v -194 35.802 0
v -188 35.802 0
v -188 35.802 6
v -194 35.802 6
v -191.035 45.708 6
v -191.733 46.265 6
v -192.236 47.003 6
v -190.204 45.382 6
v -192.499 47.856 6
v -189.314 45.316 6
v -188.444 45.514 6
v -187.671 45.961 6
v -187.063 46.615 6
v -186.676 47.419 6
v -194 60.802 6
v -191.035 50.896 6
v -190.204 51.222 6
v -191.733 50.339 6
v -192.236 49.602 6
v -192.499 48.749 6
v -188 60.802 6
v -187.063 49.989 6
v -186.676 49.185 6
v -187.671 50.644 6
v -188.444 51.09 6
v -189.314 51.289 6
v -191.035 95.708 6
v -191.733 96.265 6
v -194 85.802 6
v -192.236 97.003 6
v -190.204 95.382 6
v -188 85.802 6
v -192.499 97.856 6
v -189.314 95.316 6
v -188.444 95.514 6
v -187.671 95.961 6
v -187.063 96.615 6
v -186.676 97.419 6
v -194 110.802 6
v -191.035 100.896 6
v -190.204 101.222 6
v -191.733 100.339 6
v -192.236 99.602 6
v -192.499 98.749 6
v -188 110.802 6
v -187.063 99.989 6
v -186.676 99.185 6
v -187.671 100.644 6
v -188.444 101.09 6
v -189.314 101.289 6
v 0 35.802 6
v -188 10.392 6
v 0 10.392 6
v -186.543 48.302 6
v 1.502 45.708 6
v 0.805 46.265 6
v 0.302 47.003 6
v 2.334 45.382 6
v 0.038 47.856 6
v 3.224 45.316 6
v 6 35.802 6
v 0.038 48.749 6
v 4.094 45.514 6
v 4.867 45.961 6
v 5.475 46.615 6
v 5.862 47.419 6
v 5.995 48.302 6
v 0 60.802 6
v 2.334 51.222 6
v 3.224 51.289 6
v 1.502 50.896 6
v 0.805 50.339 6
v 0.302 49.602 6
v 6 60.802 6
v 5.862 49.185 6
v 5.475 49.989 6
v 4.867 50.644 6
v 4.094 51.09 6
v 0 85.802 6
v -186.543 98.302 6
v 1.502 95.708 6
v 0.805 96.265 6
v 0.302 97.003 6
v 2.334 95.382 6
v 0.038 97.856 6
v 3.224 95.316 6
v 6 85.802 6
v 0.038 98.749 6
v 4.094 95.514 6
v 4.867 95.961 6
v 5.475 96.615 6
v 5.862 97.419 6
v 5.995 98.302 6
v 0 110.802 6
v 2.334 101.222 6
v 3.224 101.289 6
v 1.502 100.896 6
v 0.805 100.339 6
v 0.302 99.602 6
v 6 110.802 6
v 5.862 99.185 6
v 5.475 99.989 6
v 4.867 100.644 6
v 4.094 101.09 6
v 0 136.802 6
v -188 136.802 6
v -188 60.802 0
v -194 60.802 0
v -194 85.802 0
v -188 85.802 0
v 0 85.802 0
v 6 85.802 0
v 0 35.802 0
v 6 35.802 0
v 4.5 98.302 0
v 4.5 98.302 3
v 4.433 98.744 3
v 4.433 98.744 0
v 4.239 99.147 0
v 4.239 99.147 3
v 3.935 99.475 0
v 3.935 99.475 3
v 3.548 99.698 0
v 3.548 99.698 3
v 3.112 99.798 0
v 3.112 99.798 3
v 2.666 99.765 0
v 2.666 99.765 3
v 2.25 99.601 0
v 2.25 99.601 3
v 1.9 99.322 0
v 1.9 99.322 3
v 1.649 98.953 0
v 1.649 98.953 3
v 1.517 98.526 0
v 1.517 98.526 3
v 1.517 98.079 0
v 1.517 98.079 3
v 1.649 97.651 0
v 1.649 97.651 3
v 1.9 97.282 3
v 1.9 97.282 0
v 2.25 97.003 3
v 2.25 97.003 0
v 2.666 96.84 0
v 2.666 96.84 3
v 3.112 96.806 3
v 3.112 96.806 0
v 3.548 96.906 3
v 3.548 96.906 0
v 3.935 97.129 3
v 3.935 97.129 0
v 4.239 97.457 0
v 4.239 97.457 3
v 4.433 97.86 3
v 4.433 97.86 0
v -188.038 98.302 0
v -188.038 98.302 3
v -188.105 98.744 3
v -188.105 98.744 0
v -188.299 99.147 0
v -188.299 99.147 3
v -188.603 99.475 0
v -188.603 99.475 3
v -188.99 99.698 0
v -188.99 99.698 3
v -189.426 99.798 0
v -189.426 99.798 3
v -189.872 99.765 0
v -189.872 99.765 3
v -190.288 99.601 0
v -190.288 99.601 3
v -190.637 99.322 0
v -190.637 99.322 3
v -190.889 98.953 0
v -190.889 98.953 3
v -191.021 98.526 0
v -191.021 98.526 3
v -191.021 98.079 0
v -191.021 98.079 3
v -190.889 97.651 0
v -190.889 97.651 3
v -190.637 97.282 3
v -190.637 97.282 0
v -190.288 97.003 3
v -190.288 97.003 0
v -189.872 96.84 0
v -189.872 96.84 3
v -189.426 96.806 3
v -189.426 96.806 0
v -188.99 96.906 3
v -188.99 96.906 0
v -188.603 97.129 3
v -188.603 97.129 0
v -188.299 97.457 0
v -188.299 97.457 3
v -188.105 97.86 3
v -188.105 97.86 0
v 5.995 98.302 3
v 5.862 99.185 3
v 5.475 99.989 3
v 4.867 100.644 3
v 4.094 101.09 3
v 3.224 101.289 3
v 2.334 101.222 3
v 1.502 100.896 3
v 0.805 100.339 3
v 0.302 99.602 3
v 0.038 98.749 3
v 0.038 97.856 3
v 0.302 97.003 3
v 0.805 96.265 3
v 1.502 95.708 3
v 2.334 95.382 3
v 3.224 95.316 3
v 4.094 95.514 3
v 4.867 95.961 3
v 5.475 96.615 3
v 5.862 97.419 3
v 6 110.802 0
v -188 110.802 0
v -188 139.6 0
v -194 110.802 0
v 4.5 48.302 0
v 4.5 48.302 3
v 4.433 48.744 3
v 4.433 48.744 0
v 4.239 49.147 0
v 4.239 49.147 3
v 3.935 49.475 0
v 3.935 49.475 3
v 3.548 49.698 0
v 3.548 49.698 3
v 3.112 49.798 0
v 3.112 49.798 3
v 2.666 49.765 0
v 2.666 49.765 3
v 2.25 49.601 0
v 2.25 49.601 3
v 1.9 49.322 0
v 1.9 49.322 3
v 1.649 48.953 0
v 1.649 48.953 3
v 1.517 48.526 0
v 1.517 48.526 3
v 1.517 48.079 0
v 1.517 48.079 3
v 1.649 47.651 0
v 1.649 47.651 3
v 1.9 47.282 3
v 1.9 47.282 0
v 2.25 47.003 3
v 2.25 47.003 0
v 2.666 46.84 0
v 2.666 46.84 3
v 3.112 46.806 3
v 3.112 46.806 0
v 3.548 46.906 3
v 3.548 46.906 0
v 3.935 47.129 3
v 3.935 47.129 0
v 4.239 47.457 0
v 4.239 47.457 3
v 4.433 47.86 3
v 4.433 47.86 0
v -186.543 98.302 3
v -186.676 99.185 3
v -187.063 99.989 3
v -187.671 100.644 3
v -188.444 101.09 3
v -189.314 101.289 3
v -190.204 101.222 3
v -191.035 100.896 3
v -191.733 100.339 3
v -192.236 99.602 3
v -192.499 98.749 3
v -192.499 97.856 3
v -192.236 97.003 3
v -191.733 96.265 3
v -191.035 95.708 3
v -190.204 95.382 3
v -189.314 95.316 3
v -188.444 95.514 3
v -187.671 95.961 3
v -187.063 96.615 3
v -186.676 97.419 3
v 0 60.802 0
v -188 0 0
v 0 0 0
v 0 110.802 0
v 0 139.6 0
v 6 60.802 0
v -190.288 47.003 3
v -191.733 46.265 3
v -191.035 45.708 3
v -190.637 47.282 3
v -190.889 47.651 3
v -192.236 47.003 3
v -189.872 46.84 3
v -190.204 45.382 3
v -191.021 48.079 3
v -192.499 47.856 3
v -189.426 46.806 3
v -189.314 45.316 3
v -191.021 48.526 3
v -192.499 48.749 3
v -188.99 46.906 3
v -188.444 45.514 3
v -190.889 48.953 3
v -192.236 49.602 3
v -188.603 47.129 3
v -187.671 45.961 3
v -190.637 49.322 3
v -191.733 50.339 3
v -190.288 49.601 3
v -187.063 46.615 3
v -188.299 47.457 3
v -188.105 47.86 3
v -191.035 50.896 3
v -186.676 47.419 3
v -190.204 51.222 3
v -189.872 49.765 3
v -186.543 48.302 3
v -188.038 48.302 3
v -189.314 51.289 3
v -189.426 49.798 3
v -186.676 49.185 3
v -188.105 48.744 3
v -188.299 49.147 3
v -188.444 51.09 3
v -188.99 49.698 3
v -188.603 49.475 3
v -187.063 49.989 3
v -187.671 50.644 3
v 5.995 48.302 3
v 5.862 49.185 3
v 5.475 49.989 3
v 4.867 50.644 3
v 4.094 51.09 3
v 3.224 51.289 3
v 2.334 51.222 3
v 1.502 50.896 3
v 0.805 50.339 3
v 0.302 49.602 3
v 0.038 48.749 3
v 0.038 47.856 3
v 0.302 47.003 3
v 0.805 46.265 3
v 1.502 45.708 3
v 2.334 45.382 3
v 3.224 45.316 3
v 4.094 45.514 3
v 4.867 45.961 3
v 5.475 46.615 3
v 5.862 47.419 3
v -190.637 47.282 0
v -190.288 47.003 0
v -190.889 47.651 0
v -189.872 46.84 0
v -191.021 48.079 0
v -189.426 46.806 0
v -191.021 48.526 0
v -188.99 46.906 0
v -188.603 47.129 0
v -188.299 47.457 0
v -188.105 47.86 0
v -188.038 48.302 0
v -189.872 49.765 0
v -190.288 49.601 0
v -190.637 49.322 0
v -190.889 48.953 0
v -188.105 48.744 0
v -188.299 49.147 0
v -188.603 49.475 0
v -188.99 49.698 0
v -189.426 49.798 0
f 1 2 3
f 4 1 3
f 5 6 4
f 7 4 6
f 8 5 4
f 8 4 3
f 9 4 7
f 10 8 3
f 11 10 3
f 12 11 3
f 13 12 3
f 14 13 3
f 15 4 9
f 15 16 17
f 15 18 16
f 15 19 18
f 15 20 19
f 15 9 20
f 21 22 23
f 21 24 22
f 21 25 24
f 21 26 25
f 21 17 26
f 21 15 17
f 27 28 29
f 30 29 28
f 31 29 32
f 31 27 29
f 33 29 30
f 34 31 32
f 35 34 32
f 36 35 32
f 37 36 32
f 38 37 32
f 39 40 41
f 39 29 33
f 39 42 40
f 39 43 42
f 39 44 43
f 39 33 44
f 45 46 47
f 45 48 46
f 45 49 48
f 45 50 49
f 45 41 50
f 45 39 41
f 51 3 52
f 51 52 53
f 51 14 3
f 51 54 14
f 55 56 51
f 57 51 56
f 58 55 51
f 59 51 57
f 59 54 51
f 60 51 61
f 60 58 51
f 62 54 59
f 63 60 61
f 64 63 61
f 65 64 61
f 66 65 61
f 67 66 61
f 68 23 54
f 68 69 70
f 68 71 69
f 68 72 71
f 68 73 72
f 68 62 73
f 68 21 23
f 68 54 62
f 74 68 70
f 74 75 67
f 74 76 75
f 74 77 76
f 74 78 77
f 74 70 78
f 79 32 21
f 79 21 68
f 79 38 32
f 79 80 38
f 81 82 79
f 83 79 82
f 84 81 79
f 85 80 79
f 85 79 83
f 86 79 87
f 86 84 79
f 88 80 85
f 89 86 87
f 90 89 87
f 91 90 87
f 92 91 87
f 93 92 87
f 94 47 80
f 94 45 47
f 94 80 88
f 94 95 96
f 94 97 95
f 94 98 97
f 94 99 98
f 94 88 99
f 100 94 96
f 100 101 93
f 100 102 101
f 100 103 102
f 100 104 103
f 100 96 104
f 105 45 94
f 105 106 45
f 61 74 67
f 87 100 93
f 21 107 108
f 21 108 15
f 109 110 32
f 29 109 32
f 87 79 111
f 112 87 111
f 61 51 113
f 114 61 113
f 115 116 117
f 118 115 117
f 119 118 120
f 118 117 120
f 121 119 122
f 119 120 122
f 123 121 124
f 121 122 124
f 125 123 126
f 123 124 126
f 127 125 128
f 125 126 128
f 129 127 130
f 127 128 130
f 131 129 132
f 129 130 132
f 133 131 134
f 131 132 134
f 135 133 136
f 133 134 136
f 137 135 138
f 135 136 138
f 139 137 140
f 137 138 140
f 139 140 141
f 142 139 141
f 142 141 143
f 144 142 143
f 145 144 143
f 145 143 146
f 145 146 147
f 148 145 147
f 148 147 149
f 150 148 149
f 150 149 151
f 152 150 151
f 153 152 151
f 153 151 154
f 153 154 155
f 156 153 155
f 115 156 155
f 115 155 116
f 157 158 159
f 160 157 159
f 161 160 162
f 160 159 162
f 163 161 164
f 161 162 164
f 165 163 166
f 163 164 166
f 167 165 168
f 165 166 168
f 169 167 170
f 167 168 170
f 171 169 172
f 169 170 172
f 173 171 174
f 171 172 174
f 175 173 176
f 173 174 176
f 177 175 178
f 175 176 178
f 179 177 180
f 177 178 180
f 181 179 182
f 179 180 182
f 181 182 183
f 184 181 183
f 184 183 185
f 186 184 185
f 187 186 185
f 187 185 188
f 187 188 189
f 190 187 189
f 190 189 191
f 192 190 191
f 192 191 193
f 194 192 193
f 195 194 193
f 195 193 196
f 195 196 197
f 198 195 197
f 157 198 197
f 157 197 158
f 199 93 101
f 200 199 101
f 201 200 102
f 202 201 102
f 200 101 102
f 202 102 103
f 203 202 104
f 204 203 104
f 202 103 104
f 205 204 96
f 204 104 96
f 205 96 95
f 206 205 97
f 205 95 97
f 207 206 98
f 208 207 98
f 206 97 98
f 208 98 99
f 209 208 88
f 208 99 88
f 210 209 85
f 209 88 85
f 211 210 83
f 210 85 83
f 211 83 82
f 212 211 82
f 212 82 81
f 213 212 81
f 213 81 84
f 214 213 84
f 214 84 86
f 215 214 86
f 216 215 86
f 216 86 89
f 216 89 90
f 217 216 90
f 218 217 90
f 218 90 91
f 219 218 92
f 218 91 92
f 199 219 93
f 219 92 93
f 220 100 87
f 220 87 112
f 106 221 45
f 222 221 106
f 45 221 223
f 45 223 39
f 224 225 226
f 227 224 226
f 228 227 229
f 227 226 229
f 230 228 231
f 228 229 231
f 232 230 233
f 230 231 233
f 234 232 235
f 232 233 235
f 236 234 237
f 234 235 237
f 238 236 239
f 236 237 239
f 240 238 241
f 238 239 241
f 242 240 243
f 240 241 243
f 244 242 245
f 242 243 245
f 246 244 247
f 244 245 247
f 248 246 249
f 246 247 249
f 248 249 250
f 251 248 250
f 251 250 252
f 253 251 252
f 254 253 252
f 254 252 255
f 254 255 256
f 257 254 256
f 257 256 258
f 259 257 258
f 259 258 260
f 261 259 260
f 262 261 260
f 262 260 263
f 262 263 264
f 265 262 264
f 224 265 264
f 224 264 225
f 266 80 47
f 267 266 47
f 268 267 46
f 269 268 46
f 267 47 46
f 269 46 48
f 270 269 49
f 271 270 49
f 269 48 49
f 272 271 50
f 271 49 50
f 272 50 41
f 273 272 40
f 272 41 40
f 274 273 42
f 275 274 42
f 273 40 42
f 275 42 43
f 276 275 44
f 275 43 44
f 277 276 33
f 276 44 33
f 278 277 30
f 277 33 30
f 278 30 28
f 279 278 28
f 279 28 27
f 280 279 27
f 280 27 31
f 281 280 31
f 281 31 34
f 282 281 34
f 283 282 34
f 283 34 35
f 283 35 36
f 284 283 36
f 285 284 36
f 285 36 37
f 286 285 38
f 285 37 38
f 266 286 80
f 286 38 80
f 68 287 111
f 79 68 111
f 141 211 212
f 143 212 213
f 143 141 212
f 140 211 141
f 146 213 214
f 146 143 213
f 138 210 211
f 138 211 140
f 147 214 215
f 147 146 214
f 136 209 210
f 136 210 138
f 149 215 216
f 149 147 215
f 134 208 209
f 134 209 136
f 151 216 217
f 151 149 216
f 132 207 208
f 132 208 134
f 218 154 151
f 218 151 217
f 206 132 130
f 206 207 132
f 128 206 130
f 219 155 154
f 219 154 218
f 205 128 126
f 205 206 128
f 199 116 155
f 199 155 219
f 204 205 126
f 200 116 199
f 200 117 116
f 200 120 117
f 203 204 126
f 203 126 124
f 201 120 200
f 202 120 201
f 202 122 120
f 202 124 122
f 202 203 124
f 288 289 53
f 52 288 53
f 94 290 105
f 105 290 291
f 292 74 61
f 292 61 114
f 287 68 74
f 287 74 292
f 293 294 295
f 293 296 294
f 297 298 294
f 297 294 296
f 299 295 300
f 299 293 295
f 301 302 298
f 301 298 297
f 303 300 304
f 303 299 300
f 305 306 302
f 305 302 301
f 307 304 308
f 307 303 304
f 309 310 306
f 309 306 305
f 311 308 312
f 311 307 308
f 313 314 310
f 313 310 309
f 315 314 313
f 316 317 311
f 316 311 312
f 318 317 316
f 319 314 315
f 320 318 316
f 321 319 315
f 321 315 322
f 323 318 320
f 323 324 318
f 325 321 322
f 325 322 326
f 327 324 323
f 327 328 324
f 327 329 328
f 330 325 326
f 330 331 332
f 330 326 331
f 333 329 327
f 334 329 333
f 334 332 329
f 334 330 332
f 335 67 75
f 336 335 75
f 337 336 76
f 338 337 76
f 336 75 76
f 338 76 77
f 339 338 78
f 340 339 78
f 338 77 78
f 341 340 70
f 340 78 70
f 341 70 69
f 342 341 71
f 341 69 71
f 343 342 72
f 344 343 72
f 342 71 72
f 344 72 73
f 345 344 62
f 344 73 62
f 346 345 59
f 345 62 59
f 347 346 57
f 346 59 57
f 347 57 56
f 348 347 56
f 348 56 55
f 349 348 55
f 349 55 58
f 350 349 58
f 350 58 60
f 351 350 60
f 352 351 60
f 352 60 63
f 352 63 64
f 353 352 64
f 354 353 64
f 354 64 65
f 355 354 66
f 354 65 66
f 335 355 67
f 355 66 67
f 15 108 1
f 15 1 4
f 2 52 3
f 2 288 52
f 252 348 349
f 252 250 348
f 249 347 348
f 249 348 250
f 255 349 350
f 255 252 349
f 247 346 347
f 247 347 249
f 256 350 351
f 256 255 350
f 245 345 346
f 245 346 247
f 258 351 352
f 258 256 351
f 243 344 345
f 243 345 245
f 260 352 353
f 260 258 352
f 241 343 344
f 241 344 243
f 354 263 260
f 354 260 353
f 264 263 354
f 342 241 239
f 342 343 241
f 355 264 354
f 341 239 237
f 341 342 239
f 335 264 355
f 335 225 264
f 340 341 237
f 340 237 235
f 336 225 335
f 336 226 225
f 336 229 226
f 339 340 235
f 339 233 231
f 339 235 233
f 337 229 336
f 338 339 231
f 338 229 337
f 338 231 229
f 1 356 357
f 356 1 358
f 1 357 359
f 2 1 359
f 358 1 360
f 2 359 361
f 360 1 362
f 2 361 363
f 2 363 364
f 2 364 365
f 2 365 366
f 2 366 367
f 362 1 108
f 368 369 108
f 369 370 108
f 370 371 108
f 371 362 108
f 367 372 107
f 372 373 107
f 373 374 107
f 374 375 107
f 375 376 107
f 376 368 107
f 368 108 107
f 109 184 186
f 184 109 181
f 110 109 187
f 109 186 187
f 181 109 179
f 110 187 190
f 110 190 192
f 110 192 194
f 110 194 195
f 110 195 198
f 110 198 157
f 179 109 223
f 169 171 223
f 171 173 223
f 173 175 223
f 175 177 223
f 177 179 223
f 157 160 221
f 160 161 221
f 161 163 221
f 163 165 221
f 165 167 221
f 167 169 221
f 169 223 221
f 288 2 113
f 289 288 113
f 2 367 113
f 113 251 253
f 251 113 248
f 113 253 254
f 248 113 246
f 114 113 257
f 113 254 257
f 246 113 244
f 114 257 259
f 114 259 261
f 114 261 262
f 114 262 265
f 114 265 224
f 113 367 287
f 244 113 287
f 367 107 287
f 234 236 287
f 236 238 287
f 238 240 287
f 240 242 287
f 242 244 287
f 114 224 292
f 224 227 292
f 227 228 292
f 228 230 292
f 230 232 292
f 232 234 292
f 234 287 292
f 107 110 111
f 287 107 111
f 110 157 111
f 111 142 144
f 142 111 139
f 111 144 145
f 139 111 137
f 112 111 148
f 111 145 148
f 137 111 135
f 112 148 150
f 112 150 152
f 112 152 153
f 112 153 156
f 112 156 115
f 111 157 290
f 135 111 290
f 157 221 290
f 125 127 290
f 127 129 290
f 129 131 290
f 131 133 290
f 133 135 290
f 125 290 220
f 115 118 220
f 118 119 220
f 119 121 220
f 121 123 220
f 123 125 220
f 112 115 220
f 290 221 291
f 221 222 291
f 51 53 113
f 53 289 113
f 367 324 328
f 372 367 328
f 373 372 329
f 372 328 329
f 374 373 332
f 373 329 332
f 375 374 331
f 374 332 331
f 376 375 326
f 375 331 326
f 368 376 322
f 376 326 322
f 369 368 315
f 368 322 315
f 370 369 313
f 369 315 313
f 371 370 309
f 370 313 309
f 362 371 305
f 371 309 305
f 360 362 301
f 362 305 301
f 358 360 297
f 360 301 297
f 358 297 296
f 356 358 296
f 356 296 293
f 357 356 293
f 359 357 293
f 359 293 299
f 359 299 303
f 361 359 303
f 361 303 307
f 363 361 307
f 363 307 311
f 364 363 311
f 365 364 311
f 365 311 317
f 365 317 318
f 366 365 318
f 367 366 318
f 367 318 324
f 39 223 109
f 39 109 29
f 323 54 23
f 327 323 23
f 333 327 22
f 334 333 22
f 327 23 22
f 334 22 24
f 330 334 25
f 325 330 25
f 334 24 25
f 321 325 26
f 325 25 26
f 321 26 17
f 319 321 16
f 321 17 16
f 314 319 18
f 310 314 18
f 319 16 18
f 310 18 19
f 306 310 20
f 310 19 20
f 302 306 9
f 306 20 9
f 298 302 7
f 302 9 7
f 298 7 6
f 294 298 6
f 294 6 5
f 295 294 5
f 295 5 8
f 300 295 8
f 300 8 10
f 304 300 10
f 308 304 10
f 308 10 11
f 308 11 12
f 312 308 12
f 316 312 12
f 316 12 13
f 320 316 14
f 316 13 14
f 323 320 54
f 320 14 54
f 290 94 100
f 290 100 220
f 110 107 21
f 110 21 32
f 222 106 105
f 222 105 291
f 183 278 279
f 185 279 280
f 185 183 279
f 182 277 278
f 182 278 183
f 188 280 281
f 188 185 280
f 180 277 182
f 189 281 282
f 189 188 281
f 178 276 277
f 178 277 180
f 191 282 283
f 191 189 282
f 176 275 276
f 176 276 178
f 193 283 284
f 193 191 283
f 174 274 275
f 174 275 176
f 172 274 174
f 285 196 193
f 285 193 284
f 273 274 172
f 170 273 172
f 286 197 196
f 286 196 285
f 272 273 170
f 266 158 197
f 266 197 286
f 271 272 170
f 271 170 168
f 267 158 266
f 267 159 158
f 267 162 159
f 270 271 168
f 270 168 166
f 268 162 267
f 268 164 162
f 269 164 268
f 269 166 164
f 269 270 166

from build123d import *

# Parameters (mm, degrees)
ESQUISSE1_W                  = 188
ESQUISSE1_H                  = 139.6
BOSS_EXTRU_1_DEPTH           = 6
ENL_V_START                  = -189
ENL_V_MAT_EXTRU_3_DEPTH      = 190
ENL_V_MAT_EXTRU_4_DEPTH      = 235.239535519
ENL_V_MAT_EXTRU_4_DEPTH_BACK = 235.239535519
ESQUISSE7_W                  = 6
ESQUISSE7_H                  = 25
BOSS_EXTRU_3_DEPTH           = 6
ESQUISSE9_W                  = 6
ESQUISSE9_H                  = 25
BOSS_EXTRU_4_DEPTH           = 6
ESQUISSE11_R                 = 2.995
ENL_V_MAT_EXTRU_7_DEPTH      = 3
ESQUISSE12_R                 = 1.5
ENL_V_MAT_EXTRU_8_DEPTH      = 13


with BuildPart() as part:
    # Esquisse1 → Boss.-Extru.1 (new body)
    with BuildSketch(Plane.XY):
        with Locations((-94, 69.8)):
            Rectangle(ESQUISSE1_W, ESQUISSE1_H)
    extrude(amount=BOSS_EXTRU_1_DEPTH)

    # Enlèv. mat.-Extru.3: read off the stored shape, not the designer's step
    # Enlèv. mat.-Extru.3 outline → Enlèv. mat.-Extru.3 (cut)
    with BuildSketch(Plane(origin=(0, 0, 0), x_dir=(0, 0, -1), z_dir=(1, 0, 0)).offset(ENL_V_START)):
        Polygon((-6, 139.6), (-6, 136.802154051), (0, 139.6), align=None)
    extrude(amount=ENL_V_MAT_EXTRU_3_DEPTH, mode=Mode.SUBTRACT)

    # Esquisse4 → Enlèv. mat.-Extru.4 (cut, two sides: drawn at the far end of the back side and taken through both)
    with BuildSketch(Plane(origin=(0, 0, 0), x_dir=(0, 0, -1), z_dir=(1, 0, 0)).offset(-ENL_V_MAT_EXTRU_4_DEPTH_BACK)):
        Polygon((144.728880336, -250.677774065), (0, 0), (-6, 10.392304845), (-150.728880336, 261.07007891), (-652.084428466, -28.387681762), (-356.626667793, -540.135534737), align=None)
    extrude(amount=ENL_V_MAT_EXTRU_4_DEPTH + ENL_V_MAT_EXTRU_4_DEPTH_BACK, mode=Mode.SUBTRACT)

    # Esquisse7 → Boss.-Extru.3 (add)
    with BuildSketch(Plane(origin=(0, 0, 0), x_dir=(0, 0, -1), z_dir=(1, 0, 0))):
        with Locations((-3, 98.302154051)):
            Rectangle(ESQUISSE7_W, ESQUISSE7_H)
        with Locations((-3, 48.302154051)):
            Rectangle(ESQUISSE7_W, ESQUISSE7_H)
    extrude(amount=BOSS_EXTRU_3_DEPTH)

    # Esquisse9 → Boss.-Extru.4 (add)
    with BuildSketch(Plane.ZY.offset(188)):
        with Locations((3, 48.302154051)):
            Rectangle(ESQUISSE9_W, ESQUISSE9_H)
        with Locations((3, 98.302154051)):
            Rectangle(ESQUISSE9_W, ESQUISSE9_H)
    extrude(amount=BOSS_EXTRU_4_DEPTH)

    # Esquisse11 → Enlèv. mat.-Extru.7 (cut)
    with BuildSketch(Plane.XY.offset(6)):
        with Locations((3, 48.302154051)):
            Circle(ESQUISSE11_R)
        with Locations((3, 98.302154051)):
            Circle(ESQUISSE11_R)
        with Locations((-189.537877077, 48.302154051)):
            Circle(ESQUISSE11_R)
        with Locations((-189.537877077, 98.302154051)):
            Circle(ESQUISSE11_R)
    extrude(amount=-ENL_V_MAT_EXTRU_7_DEPTH, mode=Mode.SUBTRACT)

    # Esquisse12 → Enlèv. mat.-Extru.8 (cut)
    with BuildSketch(Plane.XY.offset(6)):
        with Locations((3, 98.302154051)):
            Circle(ESQUISSE12_R)
        with Locations((3, 48.302154051)):
            Circle(ESQUISSE12_R)
        with Locations((-189.537877077, 48.302154051)):
            Circle(ESQUISSE12_R)
        with Locations((-189.537877077, 98.302154051)):
            Circle(ESQUISSE12_R)
    extrude(amount=-ENL_V_MAT_EXTRU_8_DEPTH, mode=Mode.SUBTRACT)


solid = part.part
